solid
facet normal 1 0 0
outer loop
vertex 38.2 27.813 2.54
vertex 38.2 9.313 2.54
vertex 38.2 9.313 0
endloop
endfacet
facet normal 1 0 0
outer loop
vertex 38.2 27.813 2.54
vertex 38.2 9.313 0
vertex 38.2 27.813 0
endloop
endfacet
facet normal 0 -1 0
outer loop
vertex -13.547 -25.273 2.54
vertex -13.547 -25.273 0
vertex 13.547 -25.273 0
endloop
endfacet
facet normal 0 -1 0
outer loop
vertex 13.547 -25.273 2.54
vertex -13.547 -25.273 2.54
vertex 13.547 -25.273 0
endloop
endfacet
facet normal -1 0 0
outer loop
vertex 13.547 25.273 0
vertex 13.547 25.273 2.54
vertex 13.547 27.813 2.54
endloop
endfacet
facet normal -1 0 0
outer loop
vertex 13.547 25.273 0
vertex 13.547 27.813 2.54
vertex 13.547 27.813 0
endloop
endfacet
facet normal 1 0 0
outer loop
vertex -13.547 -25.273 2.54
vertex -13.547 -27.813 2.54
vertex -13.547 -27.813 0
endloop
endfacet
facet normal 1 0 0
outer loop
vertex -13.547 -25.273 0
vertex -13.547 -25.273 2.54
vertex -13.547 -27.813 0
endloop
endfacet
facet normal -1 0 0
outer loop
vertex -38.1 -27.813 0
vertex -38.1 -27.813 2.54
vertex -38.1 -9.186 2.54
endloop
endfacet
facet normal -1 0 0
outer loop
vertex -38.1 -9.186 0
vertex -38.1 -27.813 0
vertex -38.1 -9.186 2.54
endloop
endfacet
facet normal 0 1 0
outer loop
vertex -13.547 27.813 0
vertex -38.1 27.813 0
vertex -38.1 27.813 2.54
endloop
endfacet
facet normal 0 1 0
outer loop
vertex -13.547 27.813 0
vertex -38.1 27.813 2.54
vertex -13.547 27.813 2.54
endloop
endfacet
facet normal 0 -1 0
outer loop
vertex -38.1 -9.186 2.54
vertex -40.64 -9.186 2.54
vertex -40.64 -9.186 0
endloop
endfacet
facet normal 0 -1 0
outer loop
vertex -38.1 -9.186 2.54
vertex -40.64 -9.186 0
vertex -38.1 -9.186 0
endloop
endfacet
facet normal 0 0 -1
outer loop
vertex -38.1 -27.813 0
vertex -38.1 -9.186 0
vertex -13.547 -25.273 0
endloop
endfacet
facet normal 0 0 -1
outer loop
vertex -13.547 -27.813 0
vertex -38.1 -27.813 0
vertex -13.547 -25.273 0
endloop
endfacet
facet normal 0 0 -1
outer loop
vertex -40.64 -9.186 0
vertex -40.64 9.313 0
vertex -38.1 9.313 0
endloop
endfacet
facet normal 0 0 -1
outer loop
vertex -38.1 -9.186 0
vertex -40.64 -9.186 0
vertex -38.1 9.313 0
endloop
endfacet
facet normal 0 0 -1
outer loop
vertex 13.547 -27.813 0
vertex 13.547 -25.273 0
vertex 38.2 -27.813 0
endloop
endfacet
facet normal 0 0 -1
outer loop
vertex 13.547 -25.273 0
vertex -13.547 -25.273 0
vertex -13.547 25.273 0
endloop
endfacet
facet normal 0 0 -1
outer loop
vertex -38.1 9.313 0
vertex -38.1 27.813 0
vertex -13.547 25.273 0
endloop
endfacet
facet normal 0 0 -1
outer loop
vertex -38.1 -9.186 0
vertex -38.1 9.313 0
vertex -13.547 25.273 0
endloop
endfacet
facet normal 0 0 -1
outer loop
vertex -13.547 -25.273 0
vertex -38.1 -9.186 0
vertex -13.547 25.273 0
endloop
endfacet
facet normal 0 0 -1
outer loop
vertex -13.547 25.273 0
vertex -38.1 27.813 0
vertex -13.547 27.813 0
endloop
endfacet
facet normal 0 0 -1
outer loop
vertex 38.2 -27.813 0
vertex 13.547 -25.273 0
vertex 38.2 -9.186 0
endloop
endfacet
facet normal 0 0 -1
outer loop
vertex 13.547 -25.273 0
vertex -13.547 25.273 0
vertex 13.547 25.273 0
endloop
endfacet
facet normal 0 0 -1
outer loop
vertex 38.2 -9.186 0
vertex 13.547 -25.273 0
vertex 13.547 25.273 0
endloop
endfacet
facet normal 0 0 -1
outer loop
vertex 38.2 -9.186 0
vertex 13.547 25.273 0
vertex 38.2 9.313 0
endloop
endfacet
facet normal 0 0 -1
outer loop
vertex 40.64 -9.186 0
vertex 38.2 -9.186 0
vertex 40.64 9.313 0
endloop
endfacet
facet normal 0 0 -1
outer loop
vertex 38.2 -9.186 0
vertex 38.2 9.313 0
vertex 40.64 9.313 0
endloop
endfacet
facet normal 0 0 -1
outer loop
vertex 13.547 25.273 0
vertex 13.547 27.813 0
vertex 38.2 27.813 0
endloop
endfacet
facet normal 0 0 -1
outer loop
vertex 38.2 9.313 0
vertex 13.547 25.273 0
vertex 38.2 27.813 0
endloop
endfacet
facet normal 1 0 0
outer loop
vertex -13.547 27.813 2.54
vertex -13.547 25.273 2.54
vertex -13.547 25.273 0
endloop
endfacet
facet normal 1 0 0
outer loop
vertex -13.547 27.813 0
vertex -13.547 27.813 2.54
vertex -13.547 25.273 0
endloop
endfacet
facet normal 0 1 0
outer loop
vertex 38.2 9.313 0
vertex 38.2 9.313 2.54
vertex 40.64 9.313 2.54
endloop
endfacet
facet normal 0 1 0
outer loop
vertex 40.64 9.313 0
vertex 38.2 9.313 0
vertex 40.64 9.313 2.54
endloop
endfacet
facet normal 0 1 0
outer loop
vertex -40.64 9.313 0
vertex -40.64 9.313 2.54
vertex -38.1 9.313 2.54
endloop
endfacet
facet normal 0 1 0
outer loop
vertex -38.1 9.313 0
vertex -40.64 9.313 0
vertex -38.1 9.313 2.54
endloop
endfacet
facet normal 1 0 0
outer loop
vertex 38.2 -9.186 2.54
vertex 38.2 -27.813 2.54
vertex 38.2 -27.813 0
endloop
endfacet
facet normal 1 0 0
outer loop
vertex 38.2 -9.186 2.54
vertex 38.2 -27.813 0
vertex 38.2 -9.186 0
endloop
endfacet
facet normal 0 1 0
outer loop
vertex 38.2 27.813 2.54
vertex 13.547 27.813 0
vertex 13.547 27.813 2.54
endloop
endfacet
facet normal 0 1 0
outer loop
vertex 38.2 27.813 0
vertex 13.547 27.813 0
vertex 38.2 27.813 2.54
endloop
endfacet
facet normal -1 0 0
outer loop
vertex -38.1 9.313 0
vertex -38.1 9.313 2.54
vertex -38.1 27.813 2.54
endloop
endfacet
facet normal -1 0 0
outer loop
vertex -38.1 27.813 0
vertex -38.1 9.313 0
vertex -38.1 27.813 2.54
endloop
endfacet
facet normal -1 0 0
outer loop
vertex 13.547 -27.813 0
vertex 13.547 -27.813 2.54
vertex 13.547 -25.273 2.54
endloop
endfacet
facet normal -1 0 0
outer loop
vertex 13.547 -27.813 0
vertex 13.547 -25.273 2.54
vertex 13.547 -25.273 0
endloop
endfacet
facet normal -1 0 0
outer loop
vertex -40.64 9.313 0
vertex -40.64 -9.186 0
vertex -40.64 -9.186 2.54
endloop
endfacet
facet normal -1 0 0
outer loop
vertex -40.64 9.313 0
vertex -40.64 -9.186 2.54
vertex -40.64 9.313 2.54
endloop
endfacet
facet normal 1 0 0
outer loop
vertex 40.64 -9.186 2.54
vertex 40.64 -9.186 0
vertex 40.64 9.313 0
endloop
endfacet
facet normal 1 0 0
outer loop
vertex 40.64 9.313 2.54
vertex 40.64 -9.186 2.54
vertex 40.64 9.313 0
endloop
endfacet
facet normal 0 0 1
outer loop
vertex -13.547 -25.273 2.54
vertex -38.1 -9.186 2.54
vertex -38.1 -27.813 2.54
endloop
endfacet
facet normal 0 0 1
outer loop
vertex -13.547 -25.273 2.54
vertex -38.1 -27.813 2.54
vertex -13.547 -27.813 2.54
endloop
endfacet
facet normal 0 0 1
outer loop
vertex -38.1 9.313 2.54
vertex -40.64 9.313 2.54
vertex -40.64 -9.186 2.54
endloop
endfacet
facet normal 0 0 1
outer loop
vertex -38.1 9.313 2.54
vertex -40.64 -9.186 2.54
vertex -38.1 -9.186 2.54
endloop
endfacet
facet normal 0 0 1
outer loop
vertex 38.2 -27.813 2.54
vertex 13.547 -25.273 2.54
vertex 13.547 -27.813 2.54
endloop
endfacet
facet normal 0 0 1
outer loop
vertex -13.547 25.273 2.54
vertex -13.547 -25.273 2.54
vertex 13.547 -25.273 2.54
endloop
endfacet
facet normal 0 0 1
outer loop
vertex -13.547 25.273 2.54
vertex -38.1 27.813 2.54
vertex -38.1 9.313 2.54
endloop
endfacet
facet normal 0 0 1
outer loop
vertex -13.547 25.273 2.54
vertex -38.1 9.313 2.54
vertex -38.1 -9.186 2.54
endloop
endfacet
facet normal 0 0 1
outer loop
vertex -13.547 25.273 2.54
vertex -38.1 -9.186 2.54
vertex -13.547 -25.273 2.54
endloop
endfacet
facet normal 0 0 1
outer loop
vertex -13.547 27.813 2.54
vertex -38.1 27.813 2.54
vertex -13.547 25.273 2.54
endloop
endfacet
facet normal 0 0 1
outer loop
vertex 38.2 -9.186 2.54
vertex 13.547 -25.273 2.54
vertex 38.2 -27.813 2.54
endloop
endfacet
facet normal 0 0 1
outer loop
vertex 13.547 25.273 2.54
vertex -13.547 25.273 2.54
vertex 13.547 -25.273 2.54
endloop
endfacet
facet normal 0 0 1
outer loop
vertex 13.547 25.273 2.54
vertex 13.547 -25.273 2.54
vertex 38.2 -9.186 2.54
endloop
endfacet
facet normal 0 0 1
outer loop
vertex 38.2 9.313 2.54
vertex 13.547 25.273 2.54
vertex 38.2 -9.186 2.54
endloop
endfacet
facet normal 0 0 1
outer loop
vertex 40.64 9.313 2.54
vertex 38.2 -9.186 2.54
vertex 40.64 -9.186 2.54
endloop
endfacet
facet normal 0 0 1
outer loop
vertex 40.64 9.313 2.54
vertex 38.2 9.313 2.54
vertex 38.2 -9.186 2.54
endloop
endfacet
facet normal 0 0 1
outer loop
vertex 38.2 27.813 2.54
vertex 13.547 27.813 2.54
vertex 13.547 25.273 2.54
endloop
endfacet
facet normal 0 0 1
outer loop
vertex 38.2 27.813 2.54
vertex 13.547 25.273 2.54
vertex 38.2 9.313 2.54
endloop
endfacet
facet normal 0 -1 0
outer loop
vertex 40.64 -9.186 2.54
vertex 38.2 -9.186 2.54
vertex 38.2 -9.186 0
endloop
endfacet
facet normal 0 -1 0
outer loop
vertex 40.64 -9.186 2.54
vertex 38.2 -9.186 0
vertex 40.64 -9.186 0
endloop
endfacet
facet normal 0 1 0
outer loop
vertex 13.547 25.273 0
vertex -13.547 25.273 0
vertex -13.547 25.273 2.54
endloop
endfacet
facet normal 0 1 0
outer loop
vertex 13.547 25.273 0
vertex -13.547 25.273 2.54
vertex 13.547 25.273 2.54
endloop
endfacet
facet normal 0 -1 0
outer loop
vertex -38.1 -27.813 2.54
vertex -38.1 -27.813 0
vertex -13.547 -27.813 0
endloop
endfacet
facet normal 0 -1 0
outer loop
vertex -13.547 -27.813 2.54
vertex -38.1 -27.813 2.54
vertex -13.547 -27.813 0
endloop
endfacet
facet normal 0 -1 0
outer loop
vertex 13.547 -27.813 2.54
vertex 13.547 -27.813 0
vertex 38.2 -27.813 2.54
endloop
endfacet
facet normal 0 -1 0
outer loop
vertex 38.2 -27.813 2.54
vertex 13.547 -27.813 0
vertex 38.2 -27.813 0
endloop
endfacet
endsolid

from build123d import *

# Parameters (mm, degrees)
SKETCH1_W           = 81.28
SKETCH1_H           = 55.626
BOSS_EXTRUDE1_DEPTH = 2.54
SKETCH2_W           = 2.54
SKETCH2_H           = 18.499605323
SKETCH2_H_2         = 18.818048641
CUT_EXTRUDE1_DEPTH  = 50.311501387
CAVITY9_START       = -27.813
CAVITY9_OUTLINE_W   = 27.093333334
CAVITY9_OUTLINE_H   = 2.54
CAVITY9_DEPTH       = 2.54
CAVITY9_START_2     = 25.273
CAVITY9_2_OUTLINE_W = 27.093333334
CAVITY9_2_OUTLINE_H = 2.54
CAVITY9_2_DEPTH     = 2.54


# Read off the part's stored shape, not the designer's step: Cavity9
with BuildPart() as part:
    # Sketch1 → Boss-Extrude1 (new body)
    with BuildSketch(Plane.XY):
        Rectangle(SKETCH1_W, SKETCH1_H)
    extrude(amount=BOSS_EXTRUDE1_DEPTH)

    # Sketch2 → Cut-Extrude1 (cut, through all)
    with BuildSketch(Plane.XY.offset(2.54)):
        with Locations((-39.37, 18.563197339)):
            Rectangle(SKETCH2_W, SKETCH2_H)
        with Locations((-39.37, -18.595234966)):
            Rectangle(SKETCH2_W, SKETCH2_H_2)
        with Locations((39.469570783, -18.595234966)):
            Rectangle(SKETCH2_W, SKETCH2_H_2)
        with Locations((39.469570783, 18.563197339)):
            Rectangle(SKETCH2_W, SKETCH2_H)
    extrude(amount=-CUT_EXTRUDE1_DEPTH, mode=Mode.SUBTRACT)

    # Cavity9 outline → Cavity9 (cut)
    with BuildSketch(Plane(origin=(0, 0, 0), x_dir=(1, 0, 0), z_dir=(0, 1, 0)).offset(CAVITY9_START)):
        with Locations((0, -1.27)):
            Rectangle(CAVITY9_OUTLINE_W, CAVITY9_OUTLINE_H)
    extrude(amount=CAVITY9_DEPTH, mode=Mode.SUBTRACT)

    # Cavity9 2 outline → Cavity9 2 (cut)
    with BuildSketch(Plane(origin=(0, 0, 0), x_dir=(1, 0, 0), z_dir=(0, 1, 0)).offset(CAVITY9_START_2)):
        with Locations((0, -1.27)):
            Rectangle(CAVITY9_2_OUTLINE_W, CAVITY9_2_OUTLINE_H)
    extrude(amount=CAVITY9_2_DEPTH, mode=Mode.SUBTRACT)


solid = part.part
